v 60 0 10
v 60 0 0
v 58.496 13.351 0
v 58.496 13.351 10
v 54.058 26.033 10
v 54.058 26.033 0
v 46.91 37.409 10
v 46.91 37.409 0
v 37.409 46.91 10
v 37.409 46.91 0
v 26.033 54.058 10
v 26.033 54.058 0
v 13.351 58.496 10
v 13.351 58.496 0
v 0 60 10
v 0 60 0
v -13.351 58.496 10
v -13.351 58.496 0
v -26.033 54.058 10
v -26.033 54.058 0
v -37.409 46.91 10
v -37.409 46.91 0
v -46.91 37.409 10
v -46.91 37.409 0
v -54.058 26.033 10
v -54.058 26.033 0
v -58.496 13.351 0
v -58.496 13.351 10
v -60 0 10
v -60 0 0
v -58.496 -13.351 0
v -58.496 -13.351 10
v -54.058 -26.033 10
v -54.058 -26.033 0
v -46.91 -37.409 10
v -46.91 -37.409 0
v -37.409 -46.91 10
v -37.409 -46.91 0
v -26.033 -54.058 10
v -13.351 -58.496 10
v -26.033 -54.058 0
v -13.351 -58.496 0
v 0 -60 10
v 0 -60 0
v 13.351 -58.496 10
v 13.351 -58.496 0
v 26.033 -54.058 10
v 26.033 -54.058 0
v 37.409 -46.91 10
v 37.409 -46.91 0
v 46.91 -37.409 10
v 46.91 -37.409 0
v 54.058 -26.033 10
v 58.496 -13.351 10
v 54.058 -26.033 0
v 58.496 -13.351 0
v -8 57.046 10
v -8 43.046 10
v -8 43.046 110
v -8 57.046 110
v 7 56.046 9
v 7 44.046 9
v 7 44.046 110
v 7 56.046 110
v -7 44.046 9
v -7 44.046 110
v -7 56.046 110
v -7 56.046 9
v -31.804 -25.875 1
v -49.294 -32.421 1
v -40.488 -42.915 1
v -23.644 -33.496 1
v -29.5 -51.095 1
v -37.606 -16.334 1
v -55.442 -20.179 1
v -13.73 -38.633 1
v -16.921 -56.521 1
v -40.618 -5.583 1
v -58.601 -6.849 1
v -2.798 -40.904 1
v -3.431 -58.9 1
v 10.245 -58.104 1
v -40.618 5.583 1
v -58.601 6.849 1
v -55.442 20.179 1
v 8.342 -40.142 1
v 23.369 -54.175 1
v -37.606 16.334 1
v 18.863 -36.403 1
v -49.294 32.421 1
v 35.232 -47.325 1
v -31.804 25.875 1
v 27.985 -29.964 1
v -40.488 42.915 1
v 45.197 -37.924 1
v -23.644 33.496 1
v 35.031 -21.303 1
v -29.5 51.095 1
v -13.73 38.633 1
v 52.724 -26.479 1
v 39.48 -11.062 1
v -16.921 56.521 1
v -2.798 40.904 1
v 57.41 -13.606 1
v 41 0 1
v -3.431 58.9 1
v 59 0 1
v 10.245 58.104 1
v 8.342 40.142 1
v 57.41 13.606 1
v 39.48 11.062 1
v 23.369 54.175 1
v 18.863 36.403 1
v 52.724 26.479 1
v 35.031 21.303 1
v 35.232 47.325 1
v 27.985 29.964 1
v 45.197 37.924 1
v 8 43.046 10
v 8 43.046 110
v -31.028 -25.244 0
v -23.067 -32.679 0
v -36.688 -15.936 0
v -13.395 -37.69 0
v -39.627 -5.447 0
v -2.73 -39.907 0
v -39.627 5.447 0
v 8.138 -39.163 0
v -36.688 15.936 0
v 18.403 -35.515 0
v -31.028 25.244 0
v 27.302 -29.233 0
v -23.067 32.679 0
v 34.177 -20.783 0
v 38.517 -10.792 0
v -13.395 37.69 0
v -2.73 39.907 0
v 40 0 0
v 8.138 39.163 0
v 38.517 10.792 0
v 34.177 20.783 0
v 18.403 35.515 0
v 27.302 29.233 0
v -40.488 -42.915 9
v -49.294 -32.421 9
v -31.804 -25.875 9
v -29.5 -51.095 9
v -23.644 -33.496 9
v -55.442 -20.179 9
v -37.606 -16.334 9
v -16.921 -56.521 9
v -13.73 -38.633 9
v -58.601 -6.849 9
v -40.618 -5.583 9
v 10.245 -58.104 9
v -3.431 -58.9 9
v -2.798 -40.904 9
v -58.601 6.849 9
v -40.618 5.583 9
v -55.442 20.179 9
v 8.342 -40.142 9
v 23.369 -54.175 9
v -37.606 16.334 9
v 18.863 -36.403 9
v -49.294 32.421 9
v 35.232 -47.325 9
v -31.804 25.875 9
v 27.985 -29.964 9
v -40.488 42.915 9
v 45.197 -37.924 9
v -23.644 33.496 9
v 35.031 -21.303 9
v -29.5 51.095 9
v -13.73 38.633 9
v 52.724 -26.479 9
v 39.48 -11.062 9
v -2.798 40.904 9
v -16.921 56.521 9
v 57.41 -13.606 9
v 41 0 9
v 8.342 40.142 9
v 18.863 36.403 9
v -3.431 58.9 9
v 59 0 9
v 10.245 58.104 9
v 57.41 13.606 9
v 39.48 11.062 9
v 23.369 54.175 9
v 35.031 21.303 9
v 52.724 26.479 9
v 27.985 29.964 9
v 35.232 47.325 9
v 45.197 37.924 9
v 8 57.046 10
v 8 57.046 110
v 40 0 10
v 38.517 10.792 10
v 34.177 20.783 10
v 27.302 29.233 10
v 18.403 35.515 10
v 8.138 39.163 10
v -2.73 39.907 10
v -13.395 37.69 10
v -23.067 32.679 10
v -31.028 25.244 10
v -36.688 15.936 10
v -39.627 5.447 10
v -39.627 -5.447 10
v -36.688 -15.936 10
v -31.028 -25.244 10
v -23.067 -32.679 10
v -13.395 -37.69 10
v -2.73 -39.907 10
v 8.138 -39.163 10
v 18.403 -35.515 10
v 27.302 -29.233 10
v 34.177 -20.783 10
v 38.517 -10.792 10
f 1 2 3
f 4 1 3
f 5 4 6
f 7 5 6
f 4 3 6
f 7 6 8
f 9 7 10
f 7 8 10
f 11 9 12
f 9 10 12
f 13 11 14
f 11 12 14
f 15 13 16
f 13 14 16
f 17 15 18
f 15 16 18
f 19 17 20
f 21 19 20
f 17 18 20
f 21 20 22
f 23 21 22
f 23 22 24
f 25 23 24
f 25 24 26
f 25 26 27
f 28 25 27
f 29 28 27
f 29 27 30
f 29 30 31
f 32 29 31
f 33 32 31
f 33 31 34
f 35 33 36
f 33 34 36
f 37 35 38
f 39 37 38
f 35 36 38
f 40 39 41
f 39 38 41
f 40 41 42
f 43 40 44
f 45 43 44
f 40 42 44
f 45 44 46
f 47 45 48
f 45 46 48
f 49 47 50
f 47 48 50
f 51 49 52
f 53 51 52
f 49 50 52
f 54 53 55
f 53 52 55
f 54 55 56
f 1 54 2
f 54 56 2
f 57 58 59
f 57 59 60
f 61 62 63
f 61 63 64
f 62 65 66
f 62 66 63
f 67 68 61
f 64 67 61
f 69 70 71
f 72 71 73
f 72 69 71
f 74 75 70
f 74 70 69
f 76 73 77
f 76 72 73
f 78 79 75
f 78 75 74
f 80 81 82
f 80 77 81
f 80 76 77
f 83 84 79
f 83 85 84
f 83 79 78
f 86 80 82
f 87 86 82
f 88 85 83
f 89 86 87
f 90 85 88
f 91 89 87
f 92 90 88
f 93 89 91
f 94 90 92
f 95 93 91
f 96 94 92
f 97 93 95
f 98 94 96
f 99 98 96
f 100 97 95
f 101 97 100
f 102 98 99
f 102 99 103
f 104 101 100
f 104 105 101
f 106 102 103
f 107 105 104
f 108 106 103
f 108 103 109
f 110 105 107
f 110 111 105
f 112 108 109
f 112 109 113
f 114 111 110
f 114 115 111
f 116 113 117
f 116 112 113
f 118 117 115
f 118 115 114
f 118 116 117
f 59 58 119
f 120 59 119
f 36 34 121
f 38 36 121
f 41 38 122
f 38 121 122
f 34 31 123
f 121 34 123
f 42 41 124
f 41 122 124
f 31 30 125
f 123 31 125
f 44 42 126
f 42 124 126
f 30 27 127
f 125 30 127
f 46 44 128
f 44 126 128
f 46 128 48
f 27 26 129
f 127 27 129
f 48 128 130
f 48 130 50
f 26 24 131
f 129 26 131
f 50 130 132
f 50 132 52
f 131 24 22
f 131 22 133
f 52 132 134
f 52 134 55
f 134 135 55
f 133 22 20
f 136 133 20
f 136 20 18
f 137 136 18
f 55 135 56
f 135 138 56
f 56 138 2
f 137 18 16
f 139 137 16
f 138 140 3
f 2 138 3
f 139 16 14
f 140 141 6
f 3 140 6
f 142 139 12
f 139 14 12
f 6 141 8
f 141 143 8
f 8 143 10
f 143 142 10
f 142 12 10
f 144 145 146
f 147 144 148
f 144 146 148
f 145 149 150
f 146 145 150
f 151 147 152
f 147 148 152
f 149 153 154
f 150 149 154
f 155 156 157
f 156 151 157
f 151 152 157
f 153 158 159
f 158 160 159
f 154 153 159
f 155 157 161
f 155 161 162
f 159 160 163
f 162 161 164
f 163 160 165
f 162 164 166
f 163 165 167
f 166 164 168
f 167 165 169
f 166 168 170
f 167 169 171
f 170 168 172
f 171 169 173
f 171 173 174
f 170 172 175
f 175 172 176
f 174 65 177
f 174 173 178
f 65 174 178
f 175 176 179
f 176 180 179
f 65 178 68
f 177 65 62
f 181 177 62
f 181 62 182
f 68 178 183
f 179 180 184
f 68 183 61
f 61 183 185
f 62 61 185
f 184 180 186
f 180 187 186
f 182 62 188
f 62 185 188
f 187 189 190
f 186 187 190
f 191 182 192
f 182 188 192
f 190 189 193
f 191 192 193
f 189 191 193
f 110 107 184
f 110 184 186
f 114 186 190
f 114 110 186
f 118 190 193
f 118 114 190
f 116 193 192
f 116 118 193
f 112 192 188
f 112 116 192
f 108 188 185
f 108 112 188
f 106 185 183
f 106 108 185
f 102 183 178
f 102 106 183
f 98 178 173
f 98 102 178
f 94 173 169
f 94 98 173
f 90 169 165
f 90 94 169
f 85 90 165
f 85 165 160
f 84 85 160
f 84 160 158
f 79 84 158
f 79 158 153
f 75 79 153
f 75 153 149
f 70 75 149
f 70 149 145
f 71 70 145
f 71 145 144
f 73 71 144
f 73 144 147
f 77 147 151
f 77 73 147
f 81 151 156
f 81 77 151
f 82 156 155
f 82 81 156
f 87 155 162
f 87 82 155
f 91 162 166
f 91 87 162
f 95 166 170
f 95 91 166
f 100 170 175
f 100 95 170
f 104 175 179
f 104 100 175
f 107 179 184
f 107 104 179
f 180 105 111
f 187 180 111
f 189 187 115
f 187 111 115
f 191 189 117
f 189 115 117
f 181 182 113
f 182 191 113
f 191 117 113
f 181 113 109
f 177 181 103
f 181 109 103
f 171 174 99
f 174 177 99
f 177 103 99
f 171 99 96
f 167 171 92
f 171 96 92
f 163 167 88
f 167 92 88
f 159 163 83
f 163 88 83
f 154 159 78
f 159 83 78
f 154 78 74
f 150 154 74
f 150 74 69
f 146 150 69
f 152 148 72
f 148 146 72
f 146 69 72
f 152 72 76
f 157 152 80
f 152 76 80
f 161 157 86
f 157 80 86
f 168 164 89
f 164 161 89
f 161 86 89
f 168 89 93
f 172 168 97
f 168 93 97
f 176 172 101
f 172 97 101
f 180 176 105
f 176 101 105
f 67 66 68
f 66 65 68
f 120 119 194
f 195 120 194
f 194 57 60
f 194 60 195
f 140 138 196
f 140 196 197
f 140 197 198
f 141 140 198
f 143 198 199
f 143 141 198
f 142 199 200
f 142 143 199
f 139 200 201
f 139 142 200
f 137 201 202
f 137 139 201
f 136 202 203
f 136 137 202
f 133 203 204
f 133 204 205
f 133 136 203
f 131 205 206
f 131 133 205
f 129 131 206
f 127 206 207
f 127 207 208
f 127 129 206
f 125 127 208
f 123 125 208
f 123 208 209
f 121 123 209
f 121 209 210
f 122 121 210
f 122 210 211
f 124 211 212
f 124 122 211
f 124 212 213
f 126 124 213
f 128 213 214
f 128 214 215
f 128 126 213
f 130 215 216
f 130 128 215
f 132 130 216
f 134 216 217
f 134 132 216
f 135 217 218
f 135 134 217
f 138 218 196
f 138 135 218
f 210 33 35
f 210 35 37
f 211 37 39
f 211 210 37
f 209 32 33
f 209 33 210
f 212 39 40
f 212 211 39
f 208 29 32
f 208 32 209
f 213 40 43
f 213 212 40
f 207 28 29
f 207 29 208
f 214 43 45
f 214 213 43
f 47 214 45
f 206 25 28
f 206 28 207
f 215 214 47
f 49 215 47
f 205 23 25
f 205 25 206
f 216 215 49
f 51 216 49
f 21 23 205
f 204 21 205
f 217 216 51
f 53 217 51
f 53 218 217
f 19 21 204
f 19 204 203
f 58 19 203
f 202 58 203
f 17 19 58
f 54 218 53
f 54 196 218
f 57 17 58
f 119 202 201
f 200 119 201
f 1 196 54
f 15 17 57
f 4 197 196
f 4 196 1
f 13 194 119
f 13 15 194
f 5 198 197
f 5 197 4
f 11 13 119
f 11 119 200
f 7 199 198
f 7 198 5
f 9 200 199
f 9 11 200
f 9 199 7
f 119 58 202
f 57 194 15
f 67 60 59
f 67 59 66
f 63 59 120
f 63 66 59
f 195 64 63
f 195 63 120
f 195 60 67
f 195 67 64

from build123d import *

# Parameters (mm, degrees)
F0_R     = 60
F1_DEPTH = 10
F2_R     = 40
F3_DEPTH = 10
F4_W     = 16
F4_H     = 14
F5_DEPTH = 100
F6_T     = -1


with BuildPart() as f1:
    # F0 (on Top) → F1 (new body)
    with BuildSketch(Plane.XY):
        Circle(F0_R)
    extrude(amount=F1_DEPTH)

    # F2 (on Top) → F3 (cut)
    with BuildSketch(Plane.XY):
        Circle(F2_R)
    extrude(amount=F3_DEPTH, mode=Mode.SUBTRACT)

    # F4 (on face) → F5 (join)
    with BuildSketch(Plane.XY.offset(10)):
        with Locations((0, 50.0458516181)):
            Rectangle(F4_W, F4_H)
    extrude(amount=F5_DEPTH)

    # F6
    f6_openings = [f1.faces().sort_by_distance(p)[0] for p in [
        (0, 50.045852, 110),
    ]]
    offset(amount=F6_T, openings=f6_openings, kind=Kind.INTERSECTION)


solid = f1.part
